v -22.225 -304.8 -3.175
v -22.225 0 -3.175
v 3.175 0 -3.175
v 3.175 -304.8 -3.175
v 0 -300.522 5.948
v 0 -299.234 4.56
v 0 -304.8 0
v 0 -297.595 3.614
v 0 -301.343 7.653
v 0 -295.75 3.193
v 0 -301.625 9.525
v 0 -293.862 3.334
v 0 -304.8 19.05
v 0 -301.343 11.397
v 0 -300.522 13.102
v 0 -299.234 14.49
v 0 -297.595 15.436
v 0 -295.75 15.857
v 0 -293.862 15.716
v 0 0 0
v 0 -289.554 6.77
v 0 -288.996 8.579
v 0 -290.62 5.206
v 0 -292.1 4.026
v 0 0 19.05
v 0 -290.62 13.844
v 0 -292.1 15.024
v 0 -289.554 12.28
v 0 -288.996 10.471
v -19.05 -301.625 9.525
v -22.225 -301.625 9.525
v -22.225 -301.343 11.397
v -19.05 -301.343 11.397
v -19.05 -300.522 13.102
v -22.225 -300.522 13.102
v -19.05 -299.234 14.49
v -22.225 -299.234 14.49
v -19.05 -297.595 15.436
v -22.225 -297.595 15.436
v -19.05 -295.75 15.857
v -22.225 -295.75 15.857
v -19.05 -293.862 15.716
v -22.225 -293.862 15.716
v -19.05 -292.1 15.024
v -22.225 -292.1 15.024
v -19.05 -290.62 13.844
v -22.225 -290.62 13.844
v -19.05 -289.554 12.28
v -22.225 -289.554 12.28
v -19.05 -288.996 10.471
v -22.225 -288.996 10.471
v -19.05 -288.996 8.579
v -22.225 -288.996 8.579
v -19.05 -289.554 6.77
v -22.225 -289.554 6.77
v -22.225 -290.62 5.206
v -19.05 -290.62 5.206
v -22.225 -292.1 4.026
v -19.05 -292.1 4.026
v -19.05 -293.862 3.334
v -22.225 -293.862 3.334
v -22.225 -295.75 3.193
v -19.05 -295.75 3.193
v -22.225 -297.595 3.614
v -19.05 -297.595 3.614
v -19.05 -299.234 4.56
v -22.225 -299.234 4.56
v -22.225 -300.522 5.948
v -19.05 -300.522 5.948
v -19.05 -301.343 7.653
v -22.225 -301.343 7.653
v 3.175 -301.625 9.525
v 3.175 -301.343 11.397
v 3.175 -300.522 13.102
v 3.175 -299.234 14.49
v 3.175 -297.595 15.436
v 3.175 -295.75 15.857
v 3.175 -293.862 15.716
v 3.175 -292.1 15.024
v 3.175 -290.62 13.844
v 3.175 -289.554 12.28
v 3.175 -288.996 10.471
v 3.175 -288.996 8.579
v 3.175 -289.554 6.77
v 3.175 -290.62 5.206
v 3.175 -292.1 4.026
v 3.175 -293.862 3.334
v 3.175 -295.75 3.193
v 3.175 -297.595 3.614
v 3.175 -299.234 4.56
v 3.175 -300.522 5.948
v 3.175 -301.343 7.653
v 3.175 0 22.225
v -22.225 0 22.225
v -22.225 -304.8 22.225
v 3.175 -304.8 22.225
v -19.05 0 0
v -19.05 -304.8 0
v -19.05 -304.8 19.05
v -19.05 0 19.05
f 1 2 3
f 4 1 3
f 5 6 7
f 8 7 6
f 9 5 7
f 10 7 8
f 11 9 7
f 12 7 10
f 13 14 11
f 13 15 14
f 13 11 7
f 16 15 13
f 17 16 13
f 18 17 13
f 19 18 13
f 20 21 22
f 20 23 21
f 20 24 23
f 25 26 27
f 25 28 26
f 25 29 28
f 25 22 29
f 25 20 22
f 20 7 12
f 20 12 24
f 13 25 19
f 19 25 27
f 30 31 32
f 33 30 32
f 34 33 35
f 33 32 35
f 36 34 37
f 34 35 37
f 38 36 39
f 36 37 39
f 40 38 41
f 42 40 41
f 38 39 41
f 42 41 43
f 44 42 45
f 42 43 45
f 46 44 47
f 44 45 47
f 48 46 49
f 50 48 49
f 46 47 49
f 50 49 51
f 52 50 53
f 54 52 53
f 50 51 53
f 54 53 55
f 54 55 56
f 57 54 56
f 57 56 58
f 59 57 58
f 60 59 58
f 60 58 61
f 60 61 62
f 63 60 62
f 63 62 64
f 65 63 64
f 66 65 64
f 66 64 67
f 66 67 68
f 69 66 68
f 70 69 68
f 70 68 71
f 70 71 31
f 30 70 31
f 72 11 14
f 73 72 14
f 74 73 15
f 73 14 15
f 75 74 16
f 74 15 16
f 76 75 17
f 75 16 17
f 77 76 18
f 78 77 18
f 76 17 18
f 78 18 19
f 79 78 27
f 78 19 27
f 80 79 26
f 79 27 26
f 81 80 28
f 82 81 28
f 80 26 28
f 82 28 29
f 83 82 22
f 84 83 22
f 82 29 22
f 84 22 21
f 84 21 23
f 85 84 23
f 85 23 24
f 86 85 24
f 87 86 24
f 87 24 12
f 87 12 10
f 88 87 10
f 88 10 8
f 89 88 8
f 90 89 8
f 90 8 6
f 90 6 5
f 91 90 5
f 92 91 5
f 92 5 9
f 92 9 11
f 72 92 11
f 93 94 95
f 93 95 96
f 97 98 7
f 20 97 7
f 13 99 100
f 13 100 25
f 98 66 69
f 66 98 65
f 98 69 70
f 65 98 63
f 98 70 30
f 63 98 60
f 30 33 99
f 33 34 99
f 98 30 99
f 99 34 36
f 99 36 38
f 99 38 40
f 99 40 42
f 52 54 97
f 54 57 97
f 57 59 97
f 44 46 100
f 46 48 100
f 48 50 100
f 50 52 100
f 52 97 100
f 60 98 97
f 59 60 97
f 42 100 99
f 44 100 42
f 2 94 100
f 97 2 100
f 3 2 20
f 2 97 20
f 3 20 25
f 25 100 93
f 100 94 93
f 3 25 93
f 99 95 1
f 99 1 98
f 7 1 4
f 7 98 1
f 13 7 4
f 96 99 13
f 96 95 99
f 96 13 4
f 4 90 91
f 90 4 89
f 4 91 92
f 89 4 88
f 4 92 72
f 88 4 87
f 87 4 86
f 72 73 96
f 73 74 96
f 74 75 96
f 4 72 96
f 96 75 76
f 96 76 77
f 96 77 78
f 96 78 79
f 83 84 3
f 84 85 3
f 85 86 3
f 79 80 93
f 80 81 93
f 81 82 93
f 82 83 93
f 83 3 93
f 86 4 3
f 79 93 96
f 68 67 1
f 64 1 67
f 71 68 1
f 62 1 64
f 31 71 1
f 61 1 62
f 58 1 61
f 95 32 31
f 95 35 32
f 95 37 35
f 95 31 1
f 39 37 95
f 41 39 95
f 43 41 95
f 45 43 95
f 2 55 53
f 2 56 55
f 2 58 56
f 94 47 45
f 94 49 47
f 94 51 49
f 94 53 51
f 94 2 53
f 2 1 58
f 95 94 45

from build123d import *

# Parameters (mm, degrees)
F0_W     = 25.4
F0_H     = 25.4
F0_W_2   = 19.05
F0_H_2   = 19.05
F1_DEPTH = 304.8
F3_D     = 12.7


# Not quite as in the source:
# - a feature names something its author has since deleted; it is built from what else it names


with BuildPart() as f1:
    # F0 (on Front) → F1 (new body)
    with BuildSketch(Plane.XZ):
        with Locations((-9.525, 9.525)):
            Rectangle(F0_W, F0_H)
        with Locations((-9.525, 9.525)):
            Rectangle(F0_W_2, F0_H_2, mode=Mode.SUBTRACT)
    extrude(amount=F1_DEPTH)

    # F3 (through all)
    with Locations(Plane.YZ.offset(3.175)):
        with Locations((-295.275, 9.525)):
            Hole(F3_D / 2)


solid = f1.part
